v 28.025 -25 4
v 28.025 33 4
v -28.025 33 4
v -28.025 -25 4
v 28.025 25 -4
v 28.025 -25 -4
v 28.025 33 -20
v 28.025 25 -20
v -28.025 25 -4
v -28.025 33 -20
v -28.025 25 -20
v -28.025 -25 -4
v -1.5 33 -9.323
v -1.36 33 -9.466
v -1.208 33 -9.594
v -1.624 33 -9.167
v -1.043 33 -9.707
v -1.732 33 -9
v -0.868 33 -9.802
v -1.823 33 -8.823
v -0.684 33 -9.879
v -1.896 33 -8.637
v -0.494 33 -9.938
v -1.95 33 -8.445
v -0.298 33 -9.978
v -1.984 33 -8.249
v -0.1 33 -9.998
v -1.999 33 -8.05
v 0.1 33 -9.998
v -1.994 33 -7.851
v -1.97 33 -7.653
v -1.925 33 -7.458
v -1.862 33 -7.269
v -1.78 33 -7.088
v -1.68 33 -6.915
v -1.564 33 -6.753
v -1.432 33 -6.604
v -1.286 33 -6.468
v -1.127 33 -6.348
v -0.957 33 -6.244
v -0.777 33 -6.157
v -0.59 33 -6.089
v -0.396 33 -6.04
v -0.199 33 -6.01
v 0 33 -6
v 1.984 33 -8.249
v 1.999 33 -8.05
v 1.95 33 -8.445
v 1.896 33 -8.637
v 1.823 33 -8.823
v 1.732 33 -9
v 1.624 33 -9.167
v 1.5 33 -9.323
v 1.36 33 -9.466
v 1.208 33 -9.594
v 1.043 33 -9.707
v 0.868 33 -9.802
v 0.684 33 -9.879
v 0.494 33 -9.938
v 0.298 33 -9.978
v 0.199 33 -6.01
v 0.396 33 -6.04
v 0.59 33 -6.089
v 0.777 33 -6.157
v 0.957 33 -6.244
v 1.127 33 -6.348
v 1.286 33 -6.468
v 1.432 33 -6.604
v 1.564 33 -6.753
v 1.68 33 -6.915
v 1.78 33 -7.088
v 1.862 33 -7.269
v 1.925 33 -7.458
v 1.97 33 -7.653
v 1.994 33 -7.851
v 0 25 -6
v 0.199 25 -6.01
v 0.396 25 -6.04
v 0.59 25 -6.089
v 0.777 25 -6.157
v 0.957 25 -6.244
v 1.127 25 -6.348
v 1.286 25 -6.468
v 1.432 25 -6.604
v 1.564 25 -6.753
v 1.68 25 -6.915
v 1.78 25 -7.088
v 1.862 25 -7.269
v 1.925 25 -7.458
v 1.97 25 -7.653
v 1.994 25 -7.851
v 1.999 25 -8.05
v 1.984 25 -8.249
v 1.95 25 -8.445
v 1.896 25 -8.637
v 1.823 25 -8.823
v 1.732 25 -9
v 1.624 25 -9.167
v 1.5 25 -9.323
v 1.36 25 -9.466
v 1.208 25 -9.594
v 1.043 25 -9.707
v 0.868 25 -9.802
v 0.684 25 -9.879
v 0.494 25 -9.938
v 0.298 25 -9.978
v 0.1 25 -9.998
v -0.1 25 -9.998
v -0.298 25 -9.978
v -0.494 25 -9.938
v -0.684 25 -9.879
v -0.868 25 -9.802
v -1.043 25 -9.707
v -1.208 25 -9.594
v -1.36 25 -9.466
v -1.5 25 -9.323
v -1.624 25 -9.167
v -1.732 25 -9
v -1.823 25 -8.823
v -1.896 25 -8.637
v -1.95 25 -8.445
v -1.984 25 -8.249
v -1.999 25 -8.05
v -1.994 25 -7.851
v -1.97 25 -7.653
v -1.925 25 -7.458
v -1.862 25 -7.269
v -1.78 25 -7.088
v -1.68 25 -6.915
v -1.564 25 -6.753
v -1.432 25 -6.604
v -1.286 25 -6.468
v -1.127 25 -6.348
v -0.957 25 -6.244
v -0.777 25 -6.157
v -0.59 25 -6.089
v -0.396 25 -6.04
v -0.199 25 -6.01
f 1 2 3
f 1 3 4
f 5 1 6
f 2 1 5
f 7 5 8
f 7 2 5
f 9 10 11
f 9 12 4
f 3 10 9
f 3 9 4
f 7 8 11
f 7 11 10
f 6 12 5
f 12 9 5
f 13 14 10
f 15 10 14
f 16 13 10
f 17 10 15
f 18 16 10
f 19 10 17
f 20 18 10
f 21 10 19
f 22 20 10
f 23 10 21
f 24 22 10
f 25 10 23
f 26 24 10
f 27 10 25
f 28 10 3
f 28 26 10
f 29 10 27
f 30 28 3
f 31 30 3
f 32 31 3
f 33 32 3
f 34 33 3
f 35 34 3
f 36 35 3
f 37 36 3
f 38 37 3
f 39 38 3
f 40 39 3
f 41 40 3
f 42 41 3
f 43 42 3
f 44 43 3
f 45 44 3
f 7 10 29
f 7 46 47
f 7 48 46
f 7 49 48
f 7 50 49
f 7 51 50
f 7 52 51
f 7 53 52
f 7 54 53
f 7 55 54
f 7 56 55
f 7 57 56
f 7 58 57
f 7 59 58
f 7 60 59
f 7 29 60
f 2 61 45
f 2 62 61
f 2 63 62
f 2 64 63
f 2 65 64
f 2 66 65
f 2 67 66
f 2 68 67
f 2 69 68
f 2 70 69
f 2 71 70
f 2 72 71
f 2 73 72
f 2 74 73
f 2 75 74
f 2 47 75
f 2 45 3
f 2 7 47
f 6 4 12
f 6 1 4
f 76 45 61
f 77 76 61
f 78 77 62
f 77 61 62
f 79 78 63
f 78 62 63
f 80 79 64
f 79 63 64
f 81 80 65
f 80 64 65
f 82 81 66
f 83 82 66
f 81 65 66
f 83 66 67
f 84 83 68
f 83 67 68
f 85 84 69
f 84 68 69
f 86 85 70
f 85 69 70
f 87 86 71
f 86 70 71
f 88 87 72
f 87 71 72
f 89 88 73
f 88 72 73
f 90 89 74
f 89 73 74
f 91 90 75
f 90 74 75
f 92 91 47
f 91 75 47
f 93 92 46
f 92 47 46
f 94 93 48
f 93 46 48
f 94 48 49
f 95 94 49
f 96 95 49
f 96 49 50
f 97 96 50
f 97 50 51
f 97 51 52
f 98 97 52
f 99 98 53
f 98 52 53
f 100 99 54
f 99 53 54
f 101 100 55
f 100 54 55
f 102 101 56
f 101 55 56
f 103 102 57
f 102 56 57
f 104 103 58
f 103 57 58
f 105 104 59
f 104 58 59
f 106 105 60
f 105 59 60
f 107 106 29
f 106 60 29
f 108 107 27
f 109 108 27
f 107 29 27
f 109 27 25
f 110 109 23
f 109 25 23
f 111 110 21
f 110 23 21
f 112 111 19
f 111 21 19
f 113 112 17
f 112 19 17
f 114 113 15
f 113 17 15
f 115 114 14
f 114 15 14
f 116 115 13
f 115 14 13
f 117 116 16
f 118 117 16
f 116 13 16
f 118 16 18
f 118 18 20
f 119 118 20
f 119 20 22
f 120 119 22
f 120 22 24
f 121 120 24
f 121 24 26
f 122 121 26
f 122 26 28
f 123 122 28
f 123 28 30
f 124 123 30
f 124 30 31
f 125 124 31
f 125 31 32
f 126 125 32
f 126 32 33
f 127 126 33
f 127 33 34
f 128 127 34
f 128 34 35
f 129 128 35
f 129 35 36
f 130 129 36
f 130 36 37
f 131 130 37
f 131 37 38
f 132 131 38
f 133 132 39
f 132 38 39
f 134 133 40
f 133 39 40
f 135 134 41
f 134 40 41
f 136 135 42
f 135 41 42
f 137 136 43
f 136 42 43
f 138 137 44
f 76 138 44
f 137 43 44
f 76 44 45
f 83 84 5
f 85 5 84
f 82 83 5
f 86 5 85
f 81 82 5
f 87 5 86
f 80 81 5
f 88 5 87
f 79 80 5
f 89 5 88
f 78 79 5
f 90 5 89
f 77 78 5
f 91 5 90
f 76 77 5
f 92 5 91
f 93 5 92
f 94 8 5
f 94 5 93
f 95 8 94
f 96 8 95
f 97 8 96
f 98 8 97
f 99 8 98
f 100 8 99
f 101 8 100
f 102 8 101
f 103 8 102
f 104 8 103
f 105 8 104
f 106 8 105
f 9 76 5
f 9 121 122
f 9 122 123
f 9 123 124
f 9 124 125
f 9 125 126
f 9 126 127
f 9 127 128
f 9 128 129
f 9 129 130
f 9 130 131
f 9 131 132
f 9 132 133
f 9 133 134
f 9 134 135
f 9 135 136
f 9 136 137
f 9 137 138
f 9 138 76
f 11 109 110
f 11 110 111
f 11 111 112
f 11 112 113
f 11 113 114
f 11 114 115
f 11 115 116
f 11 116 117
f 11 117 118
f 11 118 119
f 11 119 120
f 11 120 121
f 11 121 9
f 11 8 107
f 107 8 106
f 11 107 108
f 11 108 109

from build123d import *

# Parameters (mm, degrees)
SKETCH1_W           = 40.05
SKETCH1_H           = 50
BOSS_EXTRUDE1_DEPTH = 4
SKETCH2_W           = 24
SKETCH2_H           = 58
BOSS_EXTRUDE2_DEPTH = 8
SKETCH4_W           = 24
SKETCH4_H           = 58
BOSS_EXTRUDE3_DEPTH = 8
BOSS_EXTRUDE5_DEPTH = 40.05
SKETCH6_W           = 32.05
SKETCH6_H           = 50
CUT_EXTRUDE1_DEPTH  = 8
SKETCH7_R           = 2
CUT_EXTRUDE2_DEPTH  = 8
SKETCH9_R           = 2
CUT_EXTRUDE3_DEPTH  = 50
SKETCH11_W          = 16
SKETCH11_H          = 50
CUT_EXTRUDE4_DEPTH  = 80


with BuildPart() as part:
    # Sketch1 → Boss-Extrude1 (new, symmetric)
    with BuildSketch(Plane.XY):
        Rectangle(SKETCH1_W, SKETCH1_H)
    extrude(amount=BOSS_EXTRUDE1_DEPTH, both=True)

    # Sketch2 → Boss-Extrude2 (add)
    with BuildSketch(Plane(origin=(20.025, 0, 0), x_dir=(0, 0, -1), z_dir=(1, 0, 0))):
        with Locations((8, 4)):
            Rectangle(SKETCH2_W, SKETCH2_H)
    extrude(amount=BOSS_EXTRUDE2_DEPTH)

    # Sketch4 → Boss-Extrude3 (add)
    with BuildSketch(Plane.ZY.offset(20.025)):
        with Locations((-8, 4)):
            Rectangle(SKETCH4_W, SKETCH4_H)
    extrude(amount=BOSS_EXTRUDE3_DEPTH)

    # Sketch5 → Boss-Extrude5 (add)
    with BuildSketch(Plane.ZY.offset(-20.025)):
        Polygon((-20, -25), (-20, 33), (4, 33), (4, 25), (-12.05, 25), (-12.05, -25), align=None)
    extrude(amount=BOSS_EXTRUDE5_DEPTH)

    # Sketch6 → Cut-Extrude1 (cut)
    with BuildSketch(Plane(origin=(0, 0, -20), x_dir=(-1, 0, 0), z_dir=(0, 0, -1))):
        Rectangle(SKETCH6_W, SKETCH6_H)
    extrude(amount=-CUT_EXTRUDE1_DEPTH, mode=Mode.SUBTRACT)

    # Sketch7 → Cut-Extrude2 (cut)
    with BuildSketch(Plane(origin=(0, 33, 0), x_dir=(1, 0, 0), z_dir=(0, 1, 0))):
        with Locations(Location((0, 8, 0), (0, 0, 270))):
            Circle(SKETCH7_R)
    extrude(amount=-CUT_EXTRUDE2_DEPTH, mode=Mode.SUBTRACT)

    # Sketch9 → Cut-Extrude3 (cut, symmetric)
    with BuildSketch(Plane.ZY.offset(-20.025)):
        with Locations((-8.025, 0)):
            Circle(SKETCH9_R)
    extrude(amount=CUT_EXTRUDE3_DEPTH, both=True, mode=Mode.SUBTRACT)

    # Sketch11 → Cut-Extrude4 (cut)
    with BuildSketch(Plane(origin=(28.025, 0, 0), x_dir=(0, 0, -1), z_dir=(1, 0, 0))):
        with Locations((12, 0)):
            Rectangle(SKETCH11_W, SKETCH11_H)
    extrude(amount=-CUT_EXTRUDE4_DEPTH, mode=Mode.SUBTRACT)


solid = part.part
